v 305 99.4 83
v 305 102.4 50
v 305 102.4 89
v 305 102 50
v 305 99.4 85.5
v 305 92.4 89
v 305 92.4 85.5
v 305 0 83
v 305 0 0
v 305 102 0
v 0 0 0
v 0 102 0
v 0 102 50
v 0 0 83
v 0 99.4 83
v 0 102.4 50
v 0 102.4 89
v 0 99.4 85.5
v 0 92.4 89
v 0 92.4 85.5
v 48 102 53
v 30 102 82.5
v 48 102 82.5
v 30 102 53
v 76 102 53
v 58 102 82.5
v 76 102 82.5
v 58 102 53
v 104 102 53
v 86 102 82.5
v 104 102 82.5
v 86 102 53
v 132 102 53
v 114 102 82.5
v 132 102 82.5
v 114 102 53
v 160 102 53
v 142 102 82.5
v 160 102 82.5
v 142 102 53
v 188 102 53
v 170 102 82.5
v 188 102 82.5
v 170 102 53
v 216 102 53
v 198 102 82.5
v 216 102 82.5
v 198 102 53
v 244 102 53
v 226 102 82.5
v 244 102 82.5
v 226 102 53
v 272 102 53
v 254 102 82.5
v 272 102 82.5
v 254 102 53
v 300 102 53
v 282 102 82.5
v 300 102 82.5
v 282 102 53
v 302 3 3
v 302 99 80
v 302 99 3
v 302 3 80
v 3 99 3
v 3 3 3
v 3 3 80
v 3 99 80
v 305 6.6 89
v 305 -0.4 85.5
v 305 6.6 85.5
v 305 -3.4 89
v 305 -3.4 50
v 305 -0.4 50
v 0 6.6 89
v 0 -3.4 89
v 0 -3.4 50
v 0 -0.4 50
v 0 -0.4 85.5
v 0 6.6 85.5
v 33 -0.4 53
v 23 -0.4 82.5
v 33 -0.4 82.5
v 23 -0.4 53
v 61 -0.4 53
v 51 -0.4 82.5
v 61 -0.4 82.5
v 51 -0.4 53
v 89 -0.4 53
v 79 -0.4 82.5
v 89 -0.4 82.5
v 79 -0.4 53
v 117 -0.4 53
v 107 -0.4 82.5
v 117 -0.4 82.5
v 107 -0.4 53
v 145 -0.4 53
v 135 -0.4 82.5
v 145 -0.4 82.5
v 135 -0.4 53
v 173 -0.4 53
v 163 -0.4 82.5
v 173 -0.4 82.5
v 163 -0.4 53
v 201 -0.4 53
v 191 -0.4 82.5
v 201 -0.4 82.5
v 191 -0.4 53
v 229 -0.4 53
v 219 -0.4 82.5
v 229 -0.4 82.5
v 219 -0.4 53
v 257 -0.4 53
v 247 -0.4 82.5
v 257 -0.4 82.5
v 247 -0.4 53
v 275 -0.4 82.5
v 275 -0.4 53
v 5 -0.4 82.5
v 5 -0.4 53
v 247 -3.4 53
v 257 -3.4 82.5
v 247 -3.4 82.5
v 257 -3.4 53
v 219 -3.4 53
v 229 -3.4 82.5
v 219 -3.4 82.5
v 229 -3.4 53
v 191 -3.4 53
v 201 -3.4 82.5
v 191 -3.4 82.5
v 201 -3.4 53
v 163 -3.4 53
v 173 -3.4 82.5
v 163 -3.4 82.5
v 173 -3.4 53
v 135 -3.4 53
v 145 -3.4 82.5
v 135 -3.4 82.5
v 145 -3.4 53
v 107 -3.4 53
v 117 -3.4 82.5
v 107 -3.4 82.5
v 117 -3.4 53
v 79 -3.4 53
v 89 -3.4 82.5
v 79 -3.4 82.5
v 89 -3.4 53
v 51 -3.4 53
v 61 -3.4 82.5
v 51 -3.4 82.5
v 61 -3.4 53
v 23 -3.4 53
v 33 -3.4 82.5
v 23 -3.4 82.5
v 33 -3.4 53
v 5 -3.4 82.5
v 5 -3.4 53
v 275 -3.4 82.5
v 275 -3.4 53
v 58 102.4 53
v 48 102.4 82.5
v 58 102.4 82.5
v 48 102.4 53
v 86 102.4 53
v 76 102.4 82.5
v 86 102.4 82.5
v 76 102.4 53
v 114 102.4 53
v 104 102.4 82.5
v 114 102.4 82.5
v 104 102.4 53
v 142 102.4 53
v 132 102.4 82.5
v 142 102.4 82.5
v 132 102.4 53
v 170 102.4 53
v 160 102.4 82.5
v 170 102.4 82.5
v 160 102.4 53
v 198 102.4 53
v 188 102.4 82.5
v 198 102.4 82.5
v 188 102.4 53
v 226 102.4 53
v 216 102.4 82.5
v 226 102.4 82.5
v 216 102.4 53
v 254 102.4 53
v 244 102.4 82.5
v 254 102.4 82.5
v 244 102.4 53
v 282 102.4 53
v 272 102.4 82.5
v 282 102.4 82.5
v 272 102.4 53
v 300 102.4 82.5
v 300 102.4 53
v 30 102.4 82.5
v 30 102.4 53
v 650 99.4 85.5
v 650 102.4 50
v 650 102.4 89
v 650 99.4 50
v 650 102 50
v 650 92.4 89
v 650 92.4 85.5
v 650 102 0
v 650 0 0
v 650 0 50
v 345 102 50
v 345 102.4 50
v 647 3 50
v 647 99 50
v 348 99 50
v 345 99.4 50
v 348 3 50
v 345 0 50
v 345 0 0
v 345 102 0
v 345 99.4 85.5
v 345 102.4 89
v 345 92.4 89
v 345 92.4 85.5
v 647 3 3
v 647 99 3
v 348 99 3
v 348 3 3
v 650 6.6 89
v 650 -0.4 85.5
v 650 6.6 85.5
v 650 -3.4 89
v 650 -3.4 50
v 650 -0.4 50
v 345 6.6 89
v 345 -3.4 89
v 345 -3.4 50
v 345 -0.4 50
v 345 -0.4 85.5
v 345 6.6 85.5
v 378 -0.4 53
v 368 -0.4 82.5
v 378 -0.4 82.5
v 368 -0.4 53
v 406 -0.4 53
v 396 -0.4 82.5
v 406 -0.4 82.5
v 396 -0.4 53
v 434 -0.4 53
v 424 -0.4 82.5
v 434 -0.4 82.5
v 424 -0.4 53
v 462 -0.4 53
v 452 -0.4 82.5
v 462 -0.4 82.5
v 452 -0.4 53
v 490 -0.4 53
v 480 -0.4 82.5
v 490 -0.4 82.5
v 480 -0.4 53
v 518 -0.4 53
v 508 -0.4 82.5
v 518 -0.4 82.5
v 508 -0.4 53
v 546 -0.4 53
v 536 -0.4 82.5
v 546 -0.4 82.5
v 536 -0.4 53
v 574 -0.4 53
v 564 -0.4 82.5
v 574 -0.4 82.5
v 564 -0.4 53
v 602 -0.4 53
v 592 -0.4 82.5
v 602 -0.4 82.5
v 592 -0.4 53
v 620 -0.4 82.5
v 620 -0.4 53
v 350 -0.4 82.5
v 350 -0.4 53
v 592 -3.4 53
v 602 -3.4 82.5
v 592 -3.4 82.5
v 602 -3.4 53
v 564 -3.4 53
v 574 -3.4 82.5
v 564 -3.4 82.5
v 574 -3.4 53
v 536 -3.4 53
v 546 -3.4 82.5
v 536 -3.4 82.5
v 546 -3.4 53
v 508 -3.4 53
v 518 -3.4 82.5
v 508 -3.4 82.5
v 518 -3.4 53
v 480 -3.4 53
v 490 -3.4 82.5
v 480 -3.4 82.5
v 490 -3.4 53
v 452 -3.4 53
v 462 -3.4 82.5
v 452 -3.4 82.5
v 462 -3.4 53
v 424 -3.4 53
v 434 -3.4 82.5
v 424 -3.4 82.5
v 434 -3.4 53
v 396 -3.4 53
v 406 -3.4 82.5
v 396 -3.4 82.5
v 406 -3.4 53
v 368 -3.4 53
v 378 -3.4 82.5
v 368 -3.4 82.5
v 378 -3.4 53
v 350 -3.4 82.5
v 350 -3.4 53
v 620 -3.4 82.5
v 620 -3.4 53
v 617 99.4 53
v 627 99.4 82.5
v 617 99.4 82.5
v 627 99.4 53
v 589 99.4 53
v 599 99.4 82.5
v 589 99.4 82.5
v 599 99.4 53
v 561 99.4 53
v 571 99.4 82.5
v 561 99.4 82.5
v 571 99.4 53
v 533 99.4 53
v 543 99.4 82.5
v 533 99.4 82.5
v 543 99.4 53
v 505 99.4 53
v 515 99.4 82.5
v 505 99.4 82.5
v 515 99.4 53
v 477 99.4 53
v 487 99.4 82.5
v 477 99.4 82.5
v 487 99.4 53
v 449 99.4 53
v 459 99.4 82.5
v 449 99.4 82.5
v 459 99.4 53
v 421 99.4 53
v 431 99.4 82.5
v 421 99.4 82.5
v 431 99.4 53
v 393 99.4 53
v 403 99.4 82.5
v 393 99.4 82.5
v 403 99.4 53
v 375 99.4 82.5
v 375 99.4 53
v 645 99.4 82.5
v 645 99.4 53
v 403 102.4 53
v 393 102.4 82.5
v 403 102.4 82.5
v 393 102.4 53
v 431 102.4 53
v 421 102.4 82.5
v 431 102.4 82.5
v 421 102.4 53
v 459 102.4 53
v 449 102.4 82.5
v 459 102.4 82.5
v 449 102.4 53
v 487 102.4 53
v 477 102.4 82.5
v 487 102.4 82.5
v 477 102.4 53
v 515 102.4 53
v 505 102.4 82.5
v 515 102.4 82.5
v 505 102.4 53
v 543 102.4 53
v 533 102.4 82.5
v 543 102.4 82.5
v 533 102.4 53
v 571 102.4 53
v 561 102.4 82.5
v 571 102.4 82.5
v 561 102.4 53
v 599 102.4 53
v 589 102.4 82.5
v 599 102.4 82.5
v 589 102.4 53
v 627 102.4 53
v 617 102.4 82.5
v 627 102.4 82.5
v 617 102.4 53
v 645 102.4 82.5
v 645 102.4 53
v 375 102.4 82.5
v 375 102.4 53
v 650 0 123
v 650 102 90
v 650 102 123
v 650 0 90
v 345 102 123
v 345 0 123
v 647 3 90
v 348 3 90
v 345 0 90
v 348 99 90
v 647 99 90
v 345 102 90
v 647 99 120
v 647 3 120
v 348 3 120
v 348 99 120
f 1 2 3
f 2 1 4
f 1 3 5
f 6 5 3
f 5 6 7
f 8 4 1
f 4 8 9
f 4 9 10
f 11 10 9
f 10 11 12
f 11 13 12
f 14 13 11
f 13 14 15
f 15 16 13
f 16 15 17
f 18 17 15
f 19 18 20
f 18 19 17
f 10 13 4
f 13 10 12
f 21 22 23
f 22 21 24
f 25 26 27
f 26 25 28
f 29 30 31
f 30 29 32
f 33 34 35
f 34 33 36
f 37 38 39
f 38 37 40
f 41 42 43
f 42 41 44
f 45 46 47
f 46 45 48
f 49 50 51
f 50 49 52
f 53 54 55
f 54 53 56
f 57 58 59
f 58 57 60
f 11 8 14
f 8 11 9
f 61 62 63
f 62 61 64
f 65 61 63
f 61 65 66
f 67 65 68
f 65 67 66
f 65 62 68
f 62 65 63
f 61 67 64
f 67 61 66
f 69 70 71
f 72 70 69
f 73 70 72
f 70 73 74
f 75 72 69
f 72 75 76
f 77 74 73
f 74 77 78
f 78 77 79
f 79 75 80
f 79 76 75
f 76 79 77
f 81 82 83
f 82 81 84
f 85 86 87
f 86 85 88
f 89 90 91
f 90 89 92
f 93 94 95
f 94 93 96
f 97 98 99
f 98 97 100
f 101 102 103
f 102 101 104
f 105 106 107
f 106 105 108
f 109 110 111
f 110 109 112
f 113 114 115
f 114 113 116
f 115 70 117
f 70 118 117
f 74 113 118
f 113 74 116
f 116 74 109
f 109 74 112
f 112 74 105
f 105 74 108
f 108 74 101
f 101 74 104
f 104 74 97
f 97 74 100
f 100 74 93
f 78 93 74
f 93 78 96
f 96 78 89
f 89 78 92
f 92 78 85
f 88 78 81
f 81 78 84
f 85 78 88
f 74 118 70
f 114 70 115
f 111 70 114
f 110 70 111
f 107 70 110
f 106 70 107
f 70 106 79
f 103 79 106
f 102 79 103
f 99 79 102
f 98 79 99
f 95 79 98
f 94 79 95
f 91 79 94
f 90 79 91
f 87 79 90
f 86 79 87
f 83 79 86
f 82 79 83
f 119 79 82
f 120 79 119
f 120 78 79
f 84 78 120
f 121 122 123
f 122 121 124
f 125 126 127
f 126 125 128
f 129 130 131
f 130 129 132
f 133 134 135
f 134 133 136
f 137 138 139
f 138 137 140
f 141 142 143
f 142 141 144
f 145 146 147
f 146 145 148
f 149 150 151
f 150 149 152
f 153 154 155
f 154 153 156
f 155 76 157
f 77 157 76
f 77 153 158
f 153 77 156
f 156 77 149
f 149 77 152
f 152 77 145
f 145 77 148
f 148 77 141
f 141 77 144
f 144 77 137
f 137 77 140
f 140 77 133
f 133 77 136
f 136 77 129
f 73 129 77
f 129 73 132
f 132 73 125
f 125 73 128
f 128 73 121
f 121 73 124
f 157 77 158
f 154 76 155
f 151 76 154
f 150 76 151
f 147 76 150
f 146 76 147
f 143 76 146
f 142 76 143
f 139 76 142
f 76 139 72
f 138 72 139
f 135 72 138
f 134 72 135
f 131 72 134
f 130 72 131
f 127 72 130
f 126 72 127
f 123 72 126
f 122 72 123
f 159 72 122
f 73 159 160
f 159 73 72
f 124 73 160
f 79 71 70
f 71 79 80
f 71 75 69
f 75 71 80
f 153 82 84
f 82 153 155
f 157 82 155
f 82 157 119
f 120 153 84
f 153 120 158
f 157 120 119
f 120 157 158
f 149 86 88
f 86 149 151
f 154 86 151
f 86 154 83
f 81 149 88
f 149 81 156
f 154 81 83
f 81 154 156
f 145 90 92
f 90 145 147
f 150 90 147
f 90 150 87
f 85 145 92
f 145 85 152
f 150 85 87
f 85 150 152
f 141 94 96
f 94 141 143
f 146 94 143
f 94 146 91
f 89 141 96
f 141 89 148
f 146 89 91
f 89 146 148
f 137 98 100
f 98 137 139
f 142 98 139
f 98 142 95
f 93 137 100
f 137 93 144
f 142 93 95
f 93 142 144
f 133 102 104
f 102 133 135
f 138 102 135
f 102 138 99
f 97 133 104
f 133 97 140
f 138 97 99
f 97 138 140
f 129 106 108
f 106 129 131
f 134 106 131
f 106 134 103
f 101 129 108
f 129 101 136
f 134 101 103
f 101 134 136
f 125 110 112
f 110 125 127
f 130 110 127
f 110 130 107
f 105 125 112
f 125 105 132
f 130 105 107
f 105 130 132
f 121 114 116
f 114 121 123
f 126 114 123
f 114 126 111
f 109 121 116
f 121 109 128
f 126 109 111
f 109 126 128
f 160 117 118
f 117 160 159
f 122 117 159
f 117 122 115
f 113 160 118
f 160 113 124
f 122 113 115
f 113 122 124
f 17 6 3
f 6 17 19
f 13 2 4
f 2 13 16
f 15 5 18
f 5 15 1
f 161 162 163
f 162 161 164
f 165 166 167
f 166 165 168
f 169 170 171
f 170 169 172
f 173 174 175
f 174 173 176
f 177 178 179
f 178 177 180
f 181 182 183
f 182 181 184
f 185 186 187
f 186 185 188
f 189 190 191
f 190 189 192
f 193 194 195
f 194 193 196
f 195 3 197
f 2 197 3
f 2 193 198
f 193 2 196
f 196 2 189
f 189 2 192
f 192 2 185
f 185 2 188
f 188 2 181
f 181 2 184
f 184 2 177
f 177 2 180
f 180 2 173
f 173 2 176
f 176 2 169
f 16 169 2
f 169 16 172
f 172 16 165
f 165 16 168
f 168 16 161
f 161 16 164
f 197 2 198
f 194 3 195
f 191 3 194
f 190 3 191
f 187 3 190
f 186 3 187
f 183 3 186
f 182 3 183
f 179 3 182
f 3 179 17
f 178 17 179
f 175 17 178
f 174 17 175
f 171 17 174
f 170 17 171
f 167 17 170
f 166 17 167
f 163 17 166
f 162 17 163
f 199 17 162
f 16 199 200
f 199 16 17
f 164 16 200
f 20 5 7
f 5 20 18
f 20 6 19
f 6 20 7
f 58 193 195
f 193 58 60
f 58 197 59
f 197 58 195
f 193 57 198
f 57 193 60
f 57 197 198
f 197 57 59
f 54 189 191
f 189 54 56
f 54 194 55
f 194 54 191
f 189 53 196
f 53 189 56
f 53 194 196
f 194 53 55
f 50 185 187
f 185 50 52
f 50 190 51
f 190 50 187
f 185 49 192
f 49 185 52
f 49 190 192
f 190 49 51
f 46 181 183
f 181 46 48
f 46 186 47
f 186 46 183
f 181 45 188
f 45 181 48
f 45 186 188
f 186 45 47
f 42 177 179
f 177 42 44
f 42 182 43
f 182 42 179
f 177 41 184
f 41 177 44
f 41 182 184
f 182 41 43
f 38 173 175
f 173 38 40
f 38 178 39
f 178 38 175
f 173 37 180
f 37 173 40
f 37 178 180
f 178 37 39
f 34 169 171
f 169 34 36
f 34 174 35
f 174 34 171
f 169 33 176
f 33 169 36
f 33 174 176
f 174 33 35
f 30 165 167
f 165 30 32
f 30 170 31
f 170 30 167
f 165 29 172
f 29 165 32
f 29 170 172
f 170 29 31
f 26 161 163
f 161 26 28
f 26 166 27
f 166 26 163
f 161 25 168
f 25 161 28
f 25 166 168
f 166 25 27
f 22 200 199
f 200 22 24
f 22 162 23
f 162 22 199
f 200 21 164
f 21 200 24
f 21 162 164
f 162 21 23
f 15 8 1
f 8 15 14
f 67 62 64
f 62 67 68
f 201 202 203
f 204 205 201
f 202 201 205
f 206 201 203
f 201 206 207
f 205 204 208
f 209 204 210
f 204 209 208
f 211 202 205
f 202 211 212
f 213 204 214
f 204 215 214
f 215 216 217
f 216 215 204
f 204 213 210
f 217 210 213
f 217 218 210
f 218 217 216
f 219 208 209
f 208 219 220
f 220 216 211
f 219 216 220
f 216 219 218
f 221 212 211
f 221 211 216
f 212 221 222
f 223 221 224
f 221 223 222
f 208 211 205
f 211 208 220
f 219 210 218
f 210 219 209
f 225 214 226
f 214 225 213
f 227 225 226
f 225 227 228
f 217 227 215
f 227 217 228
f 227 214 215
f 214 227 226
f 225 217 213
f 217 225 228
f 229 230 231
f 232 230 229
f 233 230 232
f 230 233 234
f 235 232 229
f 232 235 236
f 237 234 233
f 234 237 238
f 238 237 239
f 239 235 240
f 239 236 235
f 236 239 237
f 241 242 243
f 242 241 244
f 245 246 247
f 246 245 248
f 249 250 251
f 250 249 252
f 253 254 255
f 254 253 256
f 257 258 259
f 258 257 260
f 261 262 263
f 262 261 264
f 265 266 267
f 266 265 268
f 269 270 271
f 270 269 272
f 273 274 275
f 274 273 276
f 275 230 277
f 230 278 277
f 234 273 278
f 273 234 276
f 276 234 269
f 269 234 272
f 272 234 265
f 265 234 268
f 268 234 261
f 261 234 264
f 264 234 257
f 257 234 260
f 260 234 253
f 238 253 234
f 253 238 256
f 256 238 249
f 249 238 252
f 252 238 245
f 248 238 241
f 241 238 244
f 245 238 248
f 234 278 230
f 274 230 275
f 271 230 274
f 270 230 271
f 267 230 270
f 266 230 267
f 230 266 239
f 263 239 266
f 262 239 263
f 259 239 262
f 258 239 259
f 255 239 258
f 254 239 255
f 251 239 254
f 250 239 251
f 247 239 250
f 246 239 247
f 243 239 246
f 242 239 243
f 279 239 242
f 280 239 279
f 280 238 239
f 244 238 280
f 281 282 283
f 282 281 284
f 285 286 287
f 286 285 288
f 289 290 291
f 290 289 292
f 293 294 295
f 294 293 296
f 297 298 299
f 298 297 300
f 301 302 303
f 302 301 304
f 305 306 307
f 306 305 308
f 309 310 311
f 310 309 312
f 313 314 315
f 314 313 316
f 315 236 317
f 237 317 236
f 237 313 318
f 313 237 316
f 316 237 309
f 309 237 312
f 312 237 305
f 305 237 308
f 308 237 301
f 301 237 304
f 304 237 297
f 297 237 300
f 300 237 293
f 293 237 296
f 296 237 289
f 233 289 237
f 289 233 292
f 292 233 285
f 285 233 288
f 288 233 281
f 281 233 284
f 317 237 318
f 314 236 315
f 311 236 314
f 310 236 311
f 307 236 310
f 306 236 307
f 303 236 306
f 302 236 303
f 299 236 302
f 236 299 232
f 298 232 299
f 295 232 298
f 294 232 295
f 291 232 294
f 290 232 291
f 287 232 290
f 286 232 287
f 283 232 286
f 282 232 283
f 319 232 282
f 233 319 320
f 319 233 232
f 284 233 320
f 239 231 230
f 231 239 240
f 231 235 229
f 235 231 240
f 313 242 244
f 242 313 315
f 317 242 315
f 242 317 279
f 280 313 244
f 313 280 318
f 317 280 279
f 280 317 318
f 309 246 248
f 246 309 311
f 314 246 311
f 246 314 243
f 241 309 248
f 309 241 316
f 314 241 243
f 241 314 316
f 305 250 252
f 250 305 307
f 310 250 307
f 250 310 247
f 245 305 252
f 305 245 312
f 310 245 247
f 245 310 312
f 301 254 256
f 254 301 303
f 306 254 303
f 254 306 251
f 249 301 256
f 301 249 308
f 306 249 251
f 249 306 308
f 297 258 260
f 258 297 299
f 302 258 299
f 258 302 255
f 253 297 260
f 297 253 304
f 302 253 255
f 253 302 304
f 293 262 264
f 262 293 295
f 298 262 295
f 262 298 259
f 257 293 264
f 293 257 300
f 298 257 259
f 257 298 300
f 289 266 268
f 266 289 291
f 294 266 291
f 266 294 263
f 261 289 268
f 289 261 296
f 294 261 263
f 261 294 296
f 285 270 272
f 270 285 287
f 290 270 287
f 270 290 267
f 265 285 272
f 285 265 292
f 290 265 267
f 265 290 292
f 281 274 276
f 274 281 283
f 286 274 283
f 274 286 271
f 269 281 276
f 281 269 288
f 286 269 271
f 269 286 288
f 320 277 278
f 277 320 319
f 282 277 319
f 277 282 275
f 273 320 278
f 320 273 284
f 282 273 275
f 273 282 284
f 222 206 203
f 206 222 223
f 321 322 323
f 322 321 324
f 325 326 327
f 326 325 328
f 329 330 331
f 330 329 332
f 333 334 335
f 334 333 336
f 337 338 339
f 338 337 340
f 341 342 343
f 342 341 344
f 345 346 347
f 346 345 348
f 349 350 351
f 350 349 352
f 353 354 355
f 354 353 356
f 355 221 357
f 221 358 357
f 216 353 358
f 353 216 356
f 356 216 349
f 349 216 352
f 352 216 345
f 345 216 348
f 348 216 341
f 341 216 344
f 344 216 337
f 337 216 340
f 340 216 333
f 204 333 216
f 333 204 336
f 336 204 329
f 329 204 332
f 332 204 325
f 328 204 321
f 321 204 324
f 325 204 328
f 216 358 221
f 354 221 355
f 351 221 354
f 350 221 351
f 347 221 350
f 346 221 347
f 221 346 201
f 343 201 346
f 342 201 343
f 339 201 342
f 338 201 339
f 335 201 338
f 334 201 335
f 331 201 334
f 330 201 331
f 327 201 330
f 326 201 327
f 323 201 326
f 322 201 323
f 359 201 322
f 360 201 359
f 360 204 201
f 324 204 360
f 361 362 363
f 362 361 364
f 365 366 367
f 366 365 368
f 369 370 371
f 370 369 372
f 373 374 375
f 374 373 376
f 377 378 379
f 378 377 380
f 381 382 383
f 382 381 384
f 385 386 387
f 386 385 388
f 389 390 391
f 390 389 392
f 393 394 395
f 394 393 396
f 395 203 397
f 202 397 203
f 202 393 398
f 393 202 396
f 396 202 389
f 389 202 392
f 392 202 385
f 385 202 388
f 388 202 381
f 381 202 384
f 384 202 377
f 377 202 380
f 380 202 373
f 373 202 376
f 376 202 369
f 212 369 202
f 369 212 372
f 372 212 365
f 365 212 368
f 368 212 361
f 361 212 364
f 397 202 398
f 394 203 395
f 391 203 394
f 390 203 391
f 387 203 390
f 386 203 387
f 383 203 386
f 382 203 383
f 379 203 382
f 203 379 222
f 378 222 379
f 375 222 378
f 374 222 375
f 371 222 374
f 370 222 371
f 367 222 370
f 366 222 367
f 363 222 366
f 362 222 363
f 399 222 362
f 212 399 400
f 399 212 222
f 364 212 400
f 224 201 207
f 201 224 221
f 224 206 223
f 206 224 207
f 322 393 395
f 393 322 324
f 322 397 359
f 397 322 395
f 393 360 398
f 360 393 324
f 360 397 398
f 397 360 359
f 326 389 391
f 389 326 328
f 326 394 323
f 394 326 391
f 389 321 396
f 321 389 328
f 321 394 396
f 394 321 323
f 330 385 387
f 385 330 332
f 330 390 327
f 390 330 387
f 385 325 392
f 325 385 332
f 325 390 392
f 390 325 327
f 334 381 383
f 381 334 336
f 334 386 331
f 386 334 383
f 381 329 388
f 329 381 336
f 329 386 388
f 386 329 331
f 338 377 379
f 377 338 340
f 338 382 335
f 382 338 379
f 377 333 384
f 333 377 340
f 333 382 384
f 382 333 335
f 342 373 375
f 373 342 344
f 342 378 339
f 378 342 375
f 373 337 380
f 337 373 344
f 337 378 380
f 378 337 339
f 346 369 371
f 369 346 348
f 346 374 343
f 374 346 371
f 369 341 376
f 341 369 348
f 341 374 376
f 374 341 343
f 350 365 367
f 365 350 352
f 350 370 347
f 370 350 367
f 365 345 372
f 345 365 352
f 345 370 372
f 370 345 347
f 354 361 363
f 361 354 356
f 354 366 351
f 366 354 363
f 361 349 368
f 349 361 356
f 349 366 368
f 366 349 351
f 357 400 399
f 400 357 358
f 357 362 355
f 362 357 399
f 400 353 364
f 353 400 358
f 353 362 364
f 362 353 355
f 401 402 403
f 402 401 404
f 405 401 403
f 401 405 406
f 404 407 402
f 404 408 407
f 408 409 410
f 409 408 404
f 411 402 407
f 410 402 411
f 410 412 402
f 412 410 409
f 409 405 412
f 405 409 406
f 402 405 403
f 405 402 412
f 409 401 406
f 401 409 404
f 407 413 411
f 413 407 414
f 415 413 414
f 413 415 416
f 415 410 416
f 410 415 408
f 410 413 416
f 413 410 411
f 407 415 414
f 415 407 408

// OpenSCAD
// 03_hook_rail.scad
// RETROFIT: Full-length continuous hook rail along BOTH long sides of the NEW tray.
// Each rail is an upright plate rising from the new tray's outer wall, running the
// full 305 mm length.  At the top, a horizontal flange hooks INWARD over the top rim.
// Lightening slots cut through the vertical plate to save material and allow flex.
// Engagement: slide or press top tray straight down — rail flanges hook over rim.
// Release: flex rail outward at mid-span (both sides simultaneously), lift.
// TOP TRAY FIXED — NO geometry added to it.
//
// LEFT: ENGAGED  |  RIGHT: EXPLODED

TW = 305; TD = 102; TH = 33;
NW = 305; ND = 102; NH = 50;
wall = 3;

// rail geometry
rail_t   = 3.0;  // rail wall thickness
rail_h   = TH + 6; // rail arm height from z=NH (clears rim, lip wraps over)
flange   = 7;    // horizontal flange width over rim
flange_t = 3.5;  // flange thickness
gap      = 0.4;  // clearance between rail inner face and top tray outer face

// lightening slots
slot_w   = 18;
slot_h   = rail_h - flange_t - 6;  // leave solid strip at top and base
slot_gap = 28;   // period
slot_y0  = 3;    // from base

C_new  = "#1565C0";
C_top  = "#90A4AE";
C_clip = "#2E7D32";  // forest green — rails

sep = NW + 40;

module new_tray_body() {
    color(C_new)
    difference() {
        cube([NW, ND, NH]);
        translate([wall, wall, wall])
            cube([NW-2*wall, ND-2*wall, NH]);
    }
}

module top_tray_body(dz=0) {
    color(C_top)
    translate([0, 0, NH + dz])
    difference() {
        cube([TW, TD, TH]);
        translate([wall, wall, 0])
            cube([TW-2*wall, TD-2*wall, TH-wall]);
    }
}

// One full-length rail for the front face (y=0 outer face).
// Rail placed so inner face at y = -gap, outer face at y = -(gap + rail_t).
// Origin at (0, -(gap+rail_t), NH) — bottom-left of rail.
module rail_front() {
    color(C_clip)
    difference() {
        union() {
            // vertical plate
            cube([NW, rail_t, rail_h]);
            // top flange curling inward (+Y)
            translate([0, 0, rail_h - flange_t])
                cube([NW, rail_t + flange, flange_t]);
        }
        // lightening slots
        for (sx = [slot_gap/2 : slot_gap : NW - slot_gap/2]) {
            translate([sx - slot_w/2, -0.1, slot_y0])
                cube([slot_w, rail_t + 0.2, slot_h]);
        }
    }
}

module all_rails() {
    // front rail (y=0 face): inner face at y=-gap
    translate([0, -(rail_t + gap), NH]) rail_front();
    // back rail (y=ND face): mirror in Y, shift to ND+gap
    translate([NW, ND + gap, NH]) mirror([1,0,0]) mirror([0,1,0]) rail_front();
}

// ENGAGED
translate([0,0,0]) {
    new_tray_body();
    all_rails();
    top_tray_body(0);
}

// EXPLODED
translate([sep,0,0]) {
    new_tray_body();
    all_rails();
    top_tray_body(40);
}
